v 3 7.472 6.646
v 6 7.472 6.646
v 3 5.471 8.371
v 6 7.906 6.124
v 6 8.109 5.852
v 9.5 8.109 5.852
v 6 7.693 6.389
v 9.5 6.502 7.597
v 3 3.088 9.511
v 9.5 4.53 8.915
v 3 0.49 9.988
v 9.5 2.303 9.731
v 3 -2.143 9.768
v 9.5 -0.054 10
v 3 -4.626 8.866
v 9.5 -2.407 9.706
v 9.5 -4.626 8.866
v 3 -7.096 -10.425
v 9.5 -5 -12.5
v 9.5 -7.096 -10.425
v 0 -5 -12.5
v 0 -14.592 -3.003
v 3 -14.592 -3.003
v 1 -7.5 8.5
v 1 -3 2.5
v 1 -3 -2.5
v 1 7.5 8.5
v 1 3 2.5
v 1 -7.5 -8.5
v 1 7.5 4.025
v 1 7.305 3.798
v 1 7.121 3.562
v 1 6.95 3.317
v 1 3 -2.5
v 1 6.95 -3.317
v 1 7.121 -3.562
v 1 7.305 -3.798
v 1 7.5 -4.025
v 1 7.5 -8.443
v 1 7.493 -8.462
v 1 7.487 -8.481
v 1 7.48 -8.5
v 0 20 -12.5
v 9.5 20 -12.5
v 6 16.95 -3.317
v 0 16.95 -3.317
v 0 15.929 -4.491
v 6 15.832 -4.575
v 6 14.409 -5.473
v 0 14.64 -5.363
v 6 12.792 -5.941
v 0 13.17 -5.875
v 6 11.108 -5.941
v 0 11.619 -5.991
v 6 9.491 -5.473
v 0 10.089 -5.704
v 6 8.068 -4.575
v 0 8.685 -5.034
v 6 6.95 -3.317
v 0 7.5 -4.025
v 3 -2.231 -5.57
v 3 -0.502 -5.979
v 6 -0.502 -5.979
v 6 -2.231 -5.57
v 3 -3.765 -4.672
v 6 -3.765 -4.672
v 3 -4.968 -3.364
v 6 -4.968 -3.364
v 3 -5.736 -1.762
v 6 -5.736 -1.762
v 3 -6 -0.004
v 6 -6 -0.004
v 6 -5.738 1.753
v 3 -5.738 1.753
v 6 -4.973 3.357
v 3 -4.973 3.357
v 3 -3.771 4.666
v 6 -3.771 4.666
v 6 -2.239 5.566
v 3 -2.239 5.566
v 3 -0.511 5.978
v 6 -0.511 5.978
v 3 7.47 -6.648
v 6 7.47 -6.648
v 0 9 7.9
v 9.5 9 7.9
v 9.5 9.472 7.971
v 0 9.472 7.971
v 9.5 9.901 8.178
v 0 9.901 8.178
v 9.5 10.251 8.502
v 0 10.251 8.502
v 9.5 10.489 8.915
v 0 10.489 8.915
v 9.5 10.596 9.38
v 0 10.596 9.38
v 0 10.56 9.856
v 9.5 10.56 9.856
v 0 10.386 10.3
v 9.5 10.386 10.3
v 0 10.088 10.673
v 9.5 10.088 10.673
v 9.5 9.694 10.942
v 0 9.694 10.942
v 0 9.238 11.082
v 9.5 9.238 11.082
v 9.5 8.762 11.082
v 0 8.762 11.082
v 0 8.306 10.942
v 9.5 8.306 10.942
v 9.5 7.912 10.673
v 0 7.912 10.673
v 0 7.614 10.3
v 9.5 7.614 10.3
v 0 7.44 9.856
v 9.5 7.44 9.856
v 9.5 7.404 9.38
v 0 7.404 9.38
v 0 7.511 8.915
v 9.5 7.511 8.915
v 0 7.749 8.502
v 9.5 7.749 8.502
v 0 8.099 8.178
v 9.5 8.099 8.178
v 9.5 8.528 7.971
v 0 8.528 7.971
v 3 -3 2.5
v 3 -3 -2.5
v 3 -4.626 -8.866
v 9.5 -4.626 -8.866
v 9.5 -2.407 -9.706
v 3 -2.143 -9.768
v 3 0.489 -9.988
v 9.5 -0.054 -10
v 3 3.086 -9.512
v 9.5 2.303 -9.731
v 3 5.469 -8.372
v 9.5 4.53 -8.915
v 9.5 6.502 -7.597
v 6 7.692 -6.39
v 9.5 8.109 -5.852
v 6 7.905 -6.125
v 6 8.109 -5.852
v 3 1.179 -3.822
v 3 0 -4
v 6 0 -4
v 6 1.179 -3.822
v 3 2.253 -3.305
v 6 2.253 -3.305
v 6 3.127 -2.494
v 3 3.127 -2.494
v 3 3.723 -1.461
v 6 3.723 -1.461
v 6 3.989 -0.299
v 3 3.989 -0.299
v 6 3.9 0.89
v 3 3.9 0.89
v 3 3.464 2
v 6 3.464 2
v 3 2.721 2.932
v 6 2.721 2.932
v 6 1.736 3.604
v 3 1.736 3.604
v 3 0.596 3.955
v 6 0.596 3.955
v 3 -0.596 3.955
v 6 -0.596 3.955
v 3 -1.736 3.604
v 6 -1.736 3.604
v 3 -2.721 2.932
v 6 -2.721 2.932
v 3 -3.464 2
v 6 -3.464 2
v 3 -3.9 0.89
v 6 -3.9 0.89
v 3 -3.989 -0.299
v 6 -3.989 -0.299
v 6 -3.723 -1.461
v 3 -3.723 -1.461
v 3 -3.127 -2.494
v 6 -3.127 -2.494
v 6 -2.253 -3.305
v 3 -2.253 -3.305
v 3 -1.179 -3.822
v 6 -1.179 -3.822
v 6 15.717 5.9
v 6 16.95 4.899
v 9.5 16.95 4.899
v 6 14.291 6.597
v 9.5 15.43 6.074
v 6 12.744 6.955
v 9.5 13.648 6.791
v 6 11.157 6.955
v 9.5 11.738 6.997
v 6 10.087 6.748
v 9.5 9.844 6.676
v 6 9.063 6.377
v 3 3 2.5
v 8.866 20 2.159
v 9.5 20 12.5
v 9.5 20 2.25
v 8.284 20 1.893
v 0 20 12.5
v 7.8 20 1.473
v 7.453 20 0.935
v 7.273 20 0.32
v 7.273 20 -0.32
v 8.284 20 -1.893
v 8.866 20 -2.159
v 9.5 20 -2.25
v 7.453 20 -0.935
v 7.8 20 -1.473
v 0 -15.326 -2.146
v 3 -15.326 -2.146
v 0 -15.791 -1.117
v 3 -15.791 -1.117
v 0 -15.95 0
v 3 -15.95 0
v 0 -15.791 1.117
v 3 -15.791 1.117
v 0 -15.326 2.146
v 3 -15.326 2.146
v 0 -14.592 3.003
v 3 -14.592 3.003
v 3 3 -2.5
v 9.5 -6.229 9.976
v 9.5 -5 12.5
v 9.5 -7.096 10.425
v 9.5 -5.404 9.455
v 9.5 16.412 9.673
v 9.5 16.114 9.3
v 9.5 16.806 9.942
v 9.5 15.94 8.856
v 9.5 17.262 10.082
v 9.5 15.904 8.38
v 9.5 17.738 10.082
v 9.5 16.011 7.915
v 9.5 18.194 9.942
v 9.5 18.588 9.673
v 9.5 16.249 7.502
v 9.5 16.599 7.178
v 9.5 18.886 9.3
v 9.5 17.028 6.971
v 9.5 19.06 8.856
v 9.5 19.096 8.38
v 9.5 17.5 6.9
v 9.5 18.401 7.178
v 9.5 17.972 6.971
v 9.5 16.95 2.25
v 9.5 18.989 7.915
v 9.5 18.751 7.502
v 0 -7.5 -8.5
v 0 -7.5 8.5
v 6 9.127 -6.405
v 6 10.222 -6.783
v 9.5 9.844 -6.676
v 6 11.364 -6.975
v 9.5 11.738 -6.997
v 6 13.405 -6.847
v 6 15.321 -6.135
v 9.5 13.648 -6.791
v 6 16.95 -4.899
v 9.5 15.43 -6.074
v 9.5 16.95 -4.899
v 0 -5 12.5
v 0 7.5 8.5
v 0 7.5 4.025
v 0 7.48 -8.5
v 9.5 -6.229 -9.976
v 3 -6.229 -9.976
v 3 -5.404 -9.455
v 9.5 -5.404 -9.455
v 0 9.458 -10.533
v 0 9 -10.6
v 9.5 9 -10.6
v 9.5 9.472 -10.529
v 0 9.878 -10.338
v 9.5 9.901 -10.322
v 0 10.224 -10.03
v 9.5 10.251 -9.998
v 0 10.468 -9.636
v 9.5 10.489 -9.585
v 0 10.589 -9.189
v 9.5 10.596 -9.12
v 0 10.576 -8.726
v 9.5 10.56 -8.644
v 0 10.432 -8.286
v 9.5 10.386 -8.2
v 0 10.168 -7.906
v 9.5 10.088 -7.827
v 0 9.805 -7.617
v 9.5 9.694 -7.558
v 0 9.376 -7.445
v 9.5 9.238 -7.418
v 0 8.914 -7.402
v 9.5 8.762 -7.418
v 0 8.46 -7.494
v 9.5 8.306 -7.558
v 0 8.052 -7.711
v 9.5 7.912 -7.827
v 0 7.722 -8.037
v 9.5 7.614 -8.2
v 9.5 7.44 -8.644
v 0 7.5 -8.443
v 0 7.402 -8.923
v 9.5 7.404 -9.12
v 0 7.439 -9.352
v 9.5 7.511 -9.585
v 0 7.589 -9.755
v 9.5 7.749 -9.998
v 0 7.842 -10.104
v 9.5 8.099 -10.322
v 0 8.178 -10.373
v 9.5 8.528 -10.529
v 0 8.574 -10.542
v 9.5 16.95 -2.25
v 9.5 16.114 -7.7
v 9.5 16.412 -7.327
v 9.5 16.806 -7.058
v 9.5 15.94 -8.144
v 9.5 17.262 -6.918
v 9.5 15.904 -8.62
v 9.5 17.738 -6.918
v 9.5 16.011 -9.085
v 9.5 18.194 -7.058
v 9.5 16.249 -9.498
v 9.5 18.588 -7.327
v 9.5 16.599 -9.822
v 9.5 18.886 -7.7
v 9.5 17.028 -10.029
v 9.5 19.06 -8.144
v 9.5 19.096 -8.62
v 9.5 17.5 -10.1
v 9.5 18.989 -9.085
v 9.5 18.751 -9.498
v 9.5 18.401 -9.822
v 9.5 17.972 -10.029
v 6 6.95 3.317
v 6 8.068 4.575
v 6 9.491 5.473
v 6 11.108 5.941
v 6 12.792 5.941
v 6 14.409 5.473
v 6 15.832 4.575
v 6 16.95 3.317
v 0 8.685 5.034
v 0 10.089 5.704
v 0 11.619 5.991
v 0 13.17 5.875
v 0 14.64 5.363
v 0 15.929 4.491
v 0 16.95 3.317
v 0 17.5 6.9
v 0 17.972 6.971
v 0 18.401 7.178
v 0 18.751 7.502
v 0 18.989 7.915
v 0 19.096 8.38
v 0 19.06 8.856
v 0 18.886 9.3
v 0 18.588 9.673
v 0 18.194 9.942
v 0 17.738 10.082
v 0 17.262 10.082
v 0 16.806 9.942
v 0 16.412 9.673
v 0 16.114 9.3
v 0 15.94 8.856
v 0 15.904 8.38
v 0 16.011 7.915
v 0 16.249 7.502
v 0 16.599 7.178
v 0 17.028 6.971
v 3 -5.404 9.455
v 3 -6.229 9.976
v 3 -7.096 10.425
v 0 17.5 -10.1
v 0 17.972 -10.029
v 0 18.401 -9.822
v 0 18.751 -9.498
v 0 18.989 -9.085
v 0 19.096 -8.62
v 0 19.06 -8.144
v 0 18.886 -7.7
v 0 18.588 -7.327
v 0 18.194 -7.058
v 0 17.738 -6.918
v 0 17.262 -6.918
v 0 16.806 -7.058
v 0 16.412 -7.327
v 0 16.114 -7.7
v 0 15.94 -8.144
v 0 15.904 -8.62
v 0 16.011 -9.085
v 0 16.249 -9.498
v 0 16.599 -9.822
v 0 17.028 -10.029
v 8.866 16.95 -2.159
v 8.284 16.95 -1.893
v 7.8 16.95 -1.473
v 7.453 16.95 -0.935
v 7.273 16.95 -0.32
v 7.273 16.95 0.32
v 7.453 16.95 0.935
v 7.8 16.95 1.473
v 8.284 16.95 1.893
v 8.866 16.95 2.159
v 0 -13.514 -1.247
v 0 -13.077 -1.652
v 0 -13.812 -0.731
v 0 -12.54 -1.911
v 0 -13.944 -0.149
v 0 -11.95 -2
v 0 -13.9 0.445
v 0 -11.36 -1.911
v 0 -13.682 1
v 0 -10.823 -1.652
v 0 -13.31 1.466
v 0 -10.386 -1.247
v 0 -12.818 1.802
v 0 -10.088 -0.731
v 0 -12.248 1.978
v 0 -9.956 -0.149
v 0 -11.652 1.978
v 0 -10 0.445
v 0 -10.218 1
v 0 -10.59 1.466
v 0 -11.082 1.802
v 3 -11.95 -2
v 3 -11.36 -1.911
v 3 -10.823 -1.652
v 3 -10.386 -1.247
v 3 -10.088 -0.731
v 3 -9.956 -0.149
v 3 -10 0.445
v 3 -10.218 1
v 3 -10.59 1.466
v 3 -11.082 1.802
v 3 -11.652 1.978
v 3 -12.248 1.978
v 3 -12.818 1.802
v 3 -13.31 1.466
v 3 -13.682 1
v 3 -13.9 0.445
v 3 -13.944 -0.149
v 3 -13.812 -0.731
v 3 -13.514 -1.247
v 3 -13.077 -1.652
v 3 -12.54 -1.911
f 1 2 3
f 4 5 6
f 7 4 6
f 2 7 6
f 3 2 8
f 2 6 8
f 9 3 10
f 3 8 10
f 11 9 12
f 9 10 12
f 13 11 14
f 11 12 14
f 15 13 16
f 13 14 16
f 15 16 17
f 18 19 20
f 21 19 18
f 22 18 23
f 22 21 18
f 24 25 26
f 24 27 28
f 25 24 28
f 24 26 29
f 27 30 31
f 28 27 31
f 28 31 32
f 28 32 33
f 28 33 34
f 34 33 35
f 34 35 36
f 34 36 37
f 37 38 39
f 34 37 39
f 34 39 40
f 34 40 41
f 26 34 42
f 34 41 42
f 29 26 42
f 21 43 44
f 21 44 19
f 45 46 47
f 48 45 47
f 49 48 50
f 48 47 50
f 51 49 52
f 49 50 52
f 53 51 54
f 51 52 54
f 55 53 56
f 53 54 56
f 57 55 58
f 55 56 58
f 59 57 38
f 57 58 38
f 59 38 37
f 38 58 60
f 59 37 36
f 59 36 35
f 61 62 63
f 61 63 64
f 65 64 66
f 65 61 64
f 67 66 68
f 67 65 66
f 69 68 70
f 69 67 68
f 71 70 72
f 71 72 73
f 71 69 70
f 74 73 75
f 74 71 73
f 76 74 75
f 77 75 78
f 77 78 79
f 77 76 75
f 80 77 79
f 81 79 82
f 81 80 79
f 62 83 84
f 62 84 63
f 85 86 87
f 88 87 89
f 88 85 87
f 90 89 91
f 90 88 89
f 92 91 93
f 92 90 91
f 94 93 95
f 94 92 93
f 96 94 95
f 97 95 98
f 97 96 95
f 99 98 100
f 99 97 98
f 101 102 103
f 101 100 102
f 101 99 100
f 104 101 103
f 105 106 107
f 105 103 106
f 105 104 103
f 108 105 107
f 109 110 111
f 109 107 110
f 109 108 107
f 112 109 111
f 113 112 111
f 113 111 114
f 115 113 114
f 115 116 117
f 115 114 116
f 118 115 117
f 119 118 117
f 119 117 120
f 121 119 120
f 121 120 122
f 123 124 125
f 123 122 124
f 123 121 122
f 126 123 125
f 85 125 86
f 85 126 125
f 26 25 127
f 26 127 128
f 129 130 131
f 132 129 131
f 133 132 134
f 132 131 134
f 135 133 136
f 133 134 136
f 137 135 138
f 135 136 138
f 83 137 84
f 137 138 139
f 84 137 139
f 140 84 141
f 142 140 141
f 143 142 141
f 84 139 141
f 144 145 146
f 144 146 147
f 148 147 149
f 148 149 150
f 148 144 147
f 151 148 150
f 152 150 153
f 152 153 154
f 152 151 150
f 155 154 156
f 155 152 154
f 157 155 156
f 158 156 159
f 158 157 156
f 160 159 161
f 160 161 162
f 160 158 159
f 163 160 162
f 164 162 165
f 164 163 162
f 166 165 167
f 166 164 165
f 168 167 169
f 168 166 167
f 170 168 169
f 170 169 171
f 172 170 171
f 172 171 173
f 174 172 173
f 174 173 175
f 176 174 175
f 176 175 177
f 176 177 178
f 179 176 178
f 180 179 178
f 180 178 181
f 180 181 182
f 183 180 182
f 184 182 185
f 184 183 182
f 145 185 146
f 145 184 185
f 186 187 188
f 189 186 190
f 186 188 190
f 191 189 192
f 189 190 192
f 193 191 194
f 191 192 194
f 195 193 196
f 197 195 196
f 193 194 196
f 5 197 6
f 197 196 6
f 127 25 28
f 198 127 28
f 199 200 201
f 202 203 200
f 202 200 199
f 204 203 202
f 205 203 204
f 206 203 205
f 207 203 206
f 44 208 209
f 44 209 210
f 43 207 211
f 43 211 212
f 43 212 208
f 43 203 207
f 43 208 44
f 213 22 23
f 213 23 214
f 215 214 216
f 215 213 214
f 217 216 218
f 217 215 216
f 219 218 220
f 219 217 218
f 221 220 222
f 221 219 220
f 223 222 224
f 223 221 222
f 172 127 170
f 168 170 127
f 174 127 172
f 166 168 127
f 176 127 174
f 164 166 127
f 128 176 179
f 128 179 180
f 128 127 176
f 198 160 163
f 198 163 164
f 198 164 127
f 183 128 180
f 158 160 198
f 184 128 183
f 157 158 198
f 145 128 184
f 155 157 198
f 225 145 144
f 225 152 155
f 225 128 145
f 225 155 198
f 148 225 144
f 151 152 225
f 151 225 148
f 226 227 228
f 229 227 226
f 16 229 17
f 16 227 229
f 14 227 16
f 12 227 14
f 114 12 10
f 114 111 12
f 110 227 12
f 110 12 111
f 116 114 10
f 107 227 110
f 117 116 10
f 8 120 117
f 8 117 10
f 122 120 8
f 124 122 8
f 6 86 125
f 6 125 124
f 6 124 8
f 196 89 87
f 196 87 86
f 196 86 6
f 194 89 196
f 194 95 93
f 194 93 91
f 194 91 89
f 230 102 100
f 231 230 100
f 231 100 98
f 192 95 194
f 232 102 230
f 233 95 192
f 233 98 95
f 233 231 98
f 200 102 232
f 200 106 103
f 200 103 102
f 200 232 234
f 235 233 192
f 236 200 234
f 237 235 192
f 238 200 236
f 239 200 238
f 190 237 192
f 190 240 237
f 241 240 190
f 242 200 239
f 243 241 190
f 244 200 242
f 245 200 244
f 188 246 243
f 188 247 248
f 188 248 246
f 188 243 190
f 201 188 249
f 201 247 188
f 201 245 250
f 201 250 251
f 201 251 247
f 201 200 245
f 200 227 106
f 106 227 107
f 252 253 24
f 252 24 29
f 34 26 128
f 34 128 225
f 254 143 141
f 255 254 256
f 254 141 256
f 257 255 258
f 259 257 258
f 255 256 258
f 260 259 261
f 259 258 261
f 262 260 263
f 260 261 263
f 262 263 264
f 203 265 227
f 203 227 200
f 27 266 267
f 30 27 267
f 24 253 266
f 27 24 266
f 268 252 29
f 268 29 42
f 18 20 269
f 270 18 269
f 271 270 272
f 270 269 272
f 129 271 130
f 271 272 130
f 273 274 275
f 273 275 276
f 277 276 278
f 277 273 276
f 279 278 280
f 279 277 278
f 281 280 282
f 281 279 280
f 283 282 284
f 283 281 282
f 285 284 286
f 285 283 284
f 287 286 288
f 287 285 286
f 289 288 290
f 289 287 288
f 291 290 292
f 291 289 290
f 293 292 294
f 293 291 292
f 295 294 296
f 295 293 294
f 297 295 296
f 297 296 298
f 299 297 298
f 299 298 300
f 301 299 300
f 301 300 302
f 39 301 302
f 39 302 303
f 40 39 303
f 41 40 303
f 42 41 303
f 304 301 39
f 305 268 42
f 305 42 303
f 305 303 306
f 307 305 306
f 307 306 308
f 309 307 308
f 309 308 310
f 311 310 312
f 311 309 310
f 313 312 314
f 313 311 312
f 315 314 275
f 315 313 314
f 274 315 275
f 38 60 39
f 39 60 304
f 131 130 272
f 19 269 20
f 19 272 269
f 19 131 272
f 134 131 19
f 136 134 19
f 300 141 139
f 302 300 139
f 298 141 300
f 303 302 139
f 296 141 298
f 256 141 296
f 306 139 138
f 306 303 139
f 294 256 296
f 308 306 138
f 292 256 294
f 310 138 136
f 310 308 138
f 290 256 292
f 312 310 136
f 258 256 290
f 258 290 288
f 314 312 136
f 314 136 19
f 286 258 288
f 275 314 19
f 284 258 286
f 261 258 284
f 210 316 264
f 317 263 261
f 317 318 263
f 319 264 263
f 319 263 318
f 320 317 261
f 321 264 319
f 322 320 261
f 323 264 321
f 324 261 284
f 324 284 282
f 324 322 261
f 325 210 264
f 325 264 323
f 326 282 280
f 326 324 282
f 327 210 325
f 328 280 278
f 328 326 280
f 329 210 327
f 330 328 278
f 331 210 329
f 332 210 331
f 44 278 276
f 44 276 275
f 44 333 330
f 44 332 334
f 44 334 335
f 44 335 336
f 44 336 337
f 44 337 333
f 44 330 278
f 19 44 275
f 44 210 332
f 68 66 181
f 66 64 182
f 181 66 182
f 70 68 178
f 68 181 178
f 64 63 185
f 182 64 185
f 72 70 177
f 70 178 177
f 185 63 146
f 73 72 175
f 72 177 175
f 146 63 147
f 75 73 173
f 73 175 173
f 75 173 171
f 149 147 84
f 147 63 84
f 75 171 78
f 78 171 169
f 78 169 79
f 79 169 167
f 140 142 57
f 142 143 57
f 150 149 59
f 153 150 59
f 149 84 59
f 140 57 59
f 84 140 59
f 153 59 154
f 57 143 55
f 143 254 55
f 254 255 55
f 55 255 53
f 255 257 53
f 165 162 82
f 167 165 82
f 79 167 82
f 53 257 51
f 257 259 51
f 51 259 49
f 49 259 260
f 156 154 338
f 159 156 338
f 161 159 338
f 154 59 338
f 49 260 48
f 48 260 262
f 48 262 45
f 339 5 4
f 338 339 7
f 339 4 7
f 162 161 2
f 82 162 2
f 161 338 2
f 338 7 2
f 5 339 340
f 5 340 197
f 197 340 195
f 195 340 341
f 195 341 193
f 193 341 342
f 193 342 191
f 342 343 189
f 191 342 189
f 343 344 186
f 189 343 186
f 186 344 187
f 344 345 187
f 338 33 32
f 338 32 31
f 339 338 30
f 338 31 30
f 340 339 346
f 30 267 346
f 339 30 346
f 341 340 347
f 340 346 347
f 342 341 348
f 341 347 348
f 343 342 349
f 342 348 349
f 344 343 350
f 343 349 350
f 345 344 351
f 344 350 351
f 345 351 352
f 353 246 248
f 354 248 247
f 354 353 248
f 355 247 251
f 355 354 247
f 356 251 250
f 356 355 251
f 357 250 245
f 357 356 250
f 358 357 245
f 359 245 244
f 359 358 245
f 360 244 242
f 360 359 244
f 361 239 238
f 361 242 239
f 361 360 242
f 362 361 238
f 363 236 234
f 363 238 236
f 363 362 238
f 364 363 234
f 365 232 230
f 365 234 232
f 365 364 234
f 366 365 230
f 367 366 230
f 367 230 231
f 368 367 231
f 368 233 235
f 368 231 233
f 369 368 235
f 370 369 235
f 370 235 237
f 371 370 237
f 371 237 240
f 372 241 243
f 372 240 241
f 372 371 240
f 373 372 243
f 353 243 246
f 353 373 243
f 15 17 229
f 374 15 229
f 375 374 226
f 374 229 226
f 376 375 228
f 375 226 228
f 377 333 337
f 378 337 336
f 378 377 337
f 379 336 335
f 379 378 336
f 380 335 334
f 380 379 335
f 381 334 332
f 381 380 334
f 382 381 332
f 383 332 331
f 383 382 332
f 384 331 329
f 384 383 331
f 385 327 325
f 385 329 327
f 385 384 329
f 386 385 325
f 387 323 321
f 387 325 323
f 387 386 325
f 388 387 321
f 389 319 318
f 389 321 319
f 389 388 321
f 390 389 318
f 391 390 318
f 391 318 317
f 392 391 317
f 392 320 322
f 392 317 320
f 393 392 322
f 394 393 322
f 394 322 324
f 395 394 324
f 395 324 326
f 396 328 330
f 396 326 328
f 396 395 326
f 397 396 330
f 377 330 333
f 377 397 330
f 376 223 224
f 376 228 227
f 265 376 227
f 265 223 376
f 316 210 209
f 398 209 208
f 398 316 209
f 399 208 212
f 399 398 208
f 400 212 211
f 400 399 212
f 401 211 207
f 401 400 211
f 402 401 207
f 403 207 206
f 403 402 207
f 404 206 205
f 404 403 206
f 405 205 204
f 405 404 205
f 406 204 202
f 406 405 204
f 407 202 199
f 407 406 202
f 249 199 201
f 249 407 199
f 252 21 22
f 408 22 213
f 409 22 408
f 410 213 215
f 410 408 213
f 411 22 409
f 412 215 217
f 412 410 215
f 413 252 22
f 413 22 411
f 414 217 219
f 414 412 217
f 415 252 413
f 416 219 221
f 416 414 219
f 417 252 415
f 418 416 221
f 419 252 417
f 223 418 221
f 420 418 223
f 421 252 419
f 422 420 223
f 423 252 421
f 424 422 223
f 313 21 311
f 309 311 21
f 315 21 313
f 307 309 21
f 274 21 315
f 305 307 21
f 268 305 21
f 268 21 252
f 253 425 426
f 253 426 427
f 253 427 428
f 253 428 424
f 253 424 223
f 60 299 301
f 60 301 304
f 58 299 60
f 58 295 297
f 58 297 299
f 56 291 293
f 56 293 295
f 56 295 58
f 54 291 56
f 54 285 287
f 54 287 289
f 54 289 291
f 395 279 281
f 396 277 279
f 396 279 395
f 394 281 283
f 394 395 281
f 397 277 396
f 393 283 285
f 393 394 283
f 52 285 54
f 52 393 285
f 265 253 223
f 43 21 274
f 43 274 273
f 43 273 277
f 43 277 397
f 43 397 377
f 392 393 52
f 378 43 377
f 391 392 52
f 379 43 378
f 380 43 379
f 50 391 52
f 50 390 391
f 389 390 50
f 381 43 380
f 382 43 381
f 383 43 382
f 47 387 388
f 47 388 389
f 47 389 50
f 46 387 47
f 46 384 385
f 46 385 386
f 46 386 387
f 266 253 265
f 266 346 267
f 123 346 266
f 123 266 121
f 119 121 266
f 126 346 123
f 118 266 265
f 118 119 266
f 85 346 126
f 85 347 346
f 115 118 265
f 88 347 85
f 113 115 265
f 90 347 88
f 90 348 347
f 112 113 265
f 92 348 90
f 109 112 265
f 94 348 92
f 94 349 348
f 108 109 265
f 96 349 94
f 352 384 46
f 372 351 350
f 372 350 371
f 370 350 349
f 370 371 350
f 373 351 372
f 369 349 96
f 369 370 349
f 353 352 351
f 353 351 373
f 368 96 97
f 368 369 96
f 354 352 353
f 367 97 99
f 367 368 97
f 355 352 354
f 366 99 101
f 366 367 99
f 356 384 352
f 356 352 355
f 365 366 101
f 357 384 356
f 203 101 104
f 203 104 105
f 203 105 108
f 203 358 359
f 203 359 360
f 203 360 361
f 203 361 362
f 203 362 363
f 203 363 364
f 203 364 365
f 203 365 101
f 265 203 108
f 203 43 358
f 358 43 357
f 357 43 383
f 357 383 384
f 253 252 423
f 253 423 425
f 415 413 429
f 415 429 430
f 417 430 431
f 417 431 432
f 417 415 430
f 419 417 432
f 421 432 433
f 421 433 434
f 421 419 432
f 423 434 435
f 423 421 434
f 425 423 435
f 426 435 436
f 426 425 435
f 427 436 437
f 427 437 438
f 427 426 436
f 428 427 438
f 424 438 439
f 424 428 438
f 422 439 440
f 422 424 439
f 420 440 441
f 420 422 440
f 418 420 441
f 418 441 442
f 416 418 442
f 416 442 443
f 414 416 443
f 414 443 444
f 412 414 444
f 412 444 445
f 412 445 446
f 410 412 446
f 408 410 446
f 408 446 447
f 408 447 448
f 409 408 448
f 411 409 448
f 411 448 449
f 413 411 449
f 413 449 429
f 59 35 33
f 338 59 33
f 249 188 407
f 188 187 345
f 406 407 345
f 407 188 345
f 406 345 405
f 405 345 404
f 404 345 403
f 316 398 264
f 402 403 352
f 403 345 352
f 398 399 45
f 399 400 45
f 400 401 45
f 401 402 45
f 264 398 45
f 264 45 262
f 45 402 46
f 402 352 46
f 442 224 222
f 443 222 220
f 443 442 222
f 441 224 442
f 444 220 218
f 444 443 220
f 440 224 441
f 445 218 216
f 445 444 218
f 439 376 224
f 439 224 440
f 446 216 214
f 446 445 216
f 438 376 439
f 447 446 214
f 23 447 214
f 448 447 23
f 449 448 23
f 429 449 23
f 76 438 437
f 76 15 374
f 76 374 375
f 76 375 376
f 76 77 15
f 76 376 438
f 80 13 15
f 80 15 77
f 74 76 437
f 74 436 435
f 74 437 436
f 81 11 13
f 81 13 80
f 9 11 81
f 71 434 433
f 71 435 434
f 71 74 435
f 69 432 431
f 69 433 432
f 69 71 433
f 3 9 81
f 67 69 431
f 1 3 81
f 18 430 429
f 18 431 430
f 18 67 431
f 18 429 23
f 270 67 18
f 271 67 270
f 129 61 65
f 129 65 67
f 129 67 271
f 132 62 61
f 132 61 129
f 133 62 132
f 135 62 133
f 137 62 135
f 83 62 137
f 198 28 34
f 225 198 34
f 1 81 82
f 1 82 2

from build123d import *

# Parameters (mm, degrees)
SKETCH1_R           = 2
SKETCH1_W           = 5
SKETCH1_H           = 6
BOSS_EXTRUDE1_DEPTH = 9.5
CUT_EXTRUDE1_START  = 9.5
SKETCH1_6_R         = 2
SKETCH1_6_W         = 5
SKETCH1_6_H         = 6
CUT_EXTRUDE1_DEPTH  = 6.5
BOSS_EXTRUDE2_START = 3
SKETCH2_R           = 4
BOSS_EXTRUDE2_DEPTH = 3
BOSS_EXTRUDE3_START = 6
BOSS_EXTRUDE3_DEPTH = 3.5
CUT_EXTRUDE2_START  = 16.95
SKETCH3_R           = 2.25
CUT_EXTRUDE2_DEPTH  = 7
SKETCH5_R           = 1.6
CUT_EXTRUDE3_DEPTH  = 10
SKETCH6_W           = 17
SKETCH6_H           = 15
CUT_EXTRUDE4_DEPTH  = 1


with BuildPart() as part:
    # Sketch1 → Boss-Extrude1 (new body)
    with BuildSketch(Plane(origin=(0, 0, 0), x_dir=(0, 0, -1), z_dir=(1, 0, 0))):
        with BuildLine():
            Line((-12.5, -5), (-12.5, 20))
            Line((-12.5, 20), (12.5, 20))
            Line((12.5, 20), (12.5, -5))
            Line((12.5, -5), (3.003242416, -14.592070209))
            ThreePointArc((3.003242416, -14.592070209), (0, -15.95), (-3.003242416, -14.592070209))
            Line((-3.003242416, -14.592070209), (-12.5, -5))
        make_face()
        with Locations((0, -11.95)):
            Circle(SKETCH1_R, mode=Mode.SUBTRACT)
        with BuildLine():
            Line((-3.31662479, 6.95), (3.31662479, 6.95))
            ThreePointArc((3.31662479, 6.95), (6, 11.95), (3.31662479, 16.95))
            Line((3.31662479, 16.95), (-3.31662479, 16.95))
            ThreePointArc((-3.31662479, 16.95), (-6, 11.95), (-3.31662479, 6.95))
        make_face(mode=Mode.SUBTRACT)
        Rectangle(SKETCH1_W, SKETCH1_H, mode=Mode.SUBTRACT)
    extrude(amount=BOSS_EXTRUDE1_DEPTH)

    # Sketch1<6> → Cut-Extrude1 (cut)
    with BuildSketch(Plane(origin=(0, 0, 0), x_dir=(0, 0, -1), z_dir=(1, 0, 0)).offset(CUT_EXTRUDE1_START)):
        with BuildLine():
            ThreePointArc((-8.865865393, -4.625627615), (-9.724278097, -5.810910858), (-10.425207588, -7.09561572))
            Line((-10.425207588, -7.09561572), (-3.003242416, -14.592070209))
            ThreePointArc((-3.003242416, -14.592070209), (0, -15.95), (3.003242416, -14.592070209))
            Line((3.003242416, -14.592070209), (10.425207588, -7.09561572))
            ThreePointArc((10.425207588, -7.09561572), (9.724278097, -5.810910858), (8.865865393, -4.625627615))
            ThreePointArc((8.865865393, -4.625627615), (9.731180291, 2.303069722), (5.85199823, 8.108891213))
            ThreePointArc((5.85199823, 8.108891213), (0, 18.95), (-5.85199823, 8.108891213))
            ThreePointArc((-5.85199823, 8.108891213), (-9.731180291, 2.303069722), (-8.865865393, -4.625627615))
        make_face()
        with Locations((0, -11.95)):
            Circle(SKETCH1_6_R, mode=Mode.SUBTRACT)
        Rectangle(SKETCH1_6_W, SKETCH1_6_H, mode=Mode.SUBTRACT)
        with BuildLine():
            Line((3.31662479, 6.95), (-3.31662479, 6.95))
            ThreePointArc((-3.31662479, 6.95), (-6, 11.95), (-3.31662479, 16.95))
            Line((-3.31662479, 16.95), (3.31662479, 16.95))
            ThreePointArc((3.31662479, 16.95), (6, 11.95), (3.31662479, 6.95))
        make_face(mode=Mode.SUBTRACT)
    extrude(amount=-CUT_EXTRUDE1_DEPTH, mode=Mode.SUBTRACT)

    # Sketch2 → Boss-Extrude2 (add)
    with BuildSketch(Plane(origin=(0, 0, 0), x_dir=(0, 0, -1), z_dir=(1, 0, 0)).offset(BOSS_EXTRUDE2_START)):
        with BuildLine():
            Line((6.975447566, 11.364225941), (5.978955057, -0.50209205))
            ThreePointArc((5.978955057, -0.50209205), (0.004288423, -5.999998467), (-5.978231221, -0.510638298))
            Line((-5.978231221, -0.510638298), (-6.954880764, 11.156505474))
            ThreePointArc((-6.954880764, 11.156505474), (-0.104368082, 18.949221907), (6.975447566, 11.364225941))
        make_face()
        Circle(SKETCH2_R, mode=Mode.SUBTRACT)
        with BuildLine():
            Line((-3.31662479, 16.95), (3.31662479, 16.95))
            ThreePointArc((3.31662479, 16.95), (6, 11.95), (3.31662479, 6.95))
            Line((3.31662479, 6.95), (-3.31662479, 6.95))
            ThreePointArc((-3.31662479, 6.95), (-6, 11.95), (-3.31662479, 16.95))
        make_face(mode=Mode.SUBTRACT)
    extrude(amount=BOSS_EXTRUDE2_DEPTH)

    # Sketch4 → Boss-Extrude3 (add)
    with BuildSketch(Plane(origin=(0, 0, 0), x_dir=(0, 0, -1), z_dir=(1, 0, 0)).offset(BOSS_EXTRUDE3_START)):
        with BuildLine():
            Line((-4.898979486, 16.95), (4.898979486, 16.95))
            ThreePointArc((4.898979486, 16.95), (0, 18.95), (-4.898979486, 16.95))
        make_face()
    extrude(amount=BOSS_EXTRUDE3_DEPTH)

    # Sketch3 → Cut-Extrude2 (cut)
    with BuildSketch(Plane(origin=(0, 0, 0), x_dir=(1, 0, 0), z_dir=(0, 1, 0)).offset(CUT_EXTRUDE2_START)):
        with Locations((9.5, 0)):
            Circle(SKETCH3_R)
    extrude(amount=CUT_EXTRUDE2_DEPTH, mode=Mode.SUBTRACT)

    # Sketch5 → Cut-Extrude3 (cut)
    with BuildSketch(Plane(origin=(0, 0, 0), x_dir=(0, 0, -1), z_dir=(1, 0, 0))):
        with Locations((8.5, 17.5)):
            Circle(SKETCH5_R)
        with Locations((-8.5, 17.5)):
            Circle(SKETCH5_R)
        with Locations((9, 9)):
            Circle(SKETCH5_R)
        with Locations((-9.5, 9)):
            Circle(SKETCH5_R)
    extrude(amount=CUT_EXTRUDE3_DEPTH, mode=Mode.SUBTRACT)

    # Sketch6 → Cut-Extrude4 (cut)
    with BuildSketch(Plane(origin=(0, 0, 0), x_dir=(0, 0, -1), z_dir=(1, 0, 0))):
        Rectangle(SKETCH6_W, SKETCH6_H)
    extrude(amount=CUT_EXTRUDE4_DEPTH, mode=Mode.SUBTRACT)


solid = part.part
